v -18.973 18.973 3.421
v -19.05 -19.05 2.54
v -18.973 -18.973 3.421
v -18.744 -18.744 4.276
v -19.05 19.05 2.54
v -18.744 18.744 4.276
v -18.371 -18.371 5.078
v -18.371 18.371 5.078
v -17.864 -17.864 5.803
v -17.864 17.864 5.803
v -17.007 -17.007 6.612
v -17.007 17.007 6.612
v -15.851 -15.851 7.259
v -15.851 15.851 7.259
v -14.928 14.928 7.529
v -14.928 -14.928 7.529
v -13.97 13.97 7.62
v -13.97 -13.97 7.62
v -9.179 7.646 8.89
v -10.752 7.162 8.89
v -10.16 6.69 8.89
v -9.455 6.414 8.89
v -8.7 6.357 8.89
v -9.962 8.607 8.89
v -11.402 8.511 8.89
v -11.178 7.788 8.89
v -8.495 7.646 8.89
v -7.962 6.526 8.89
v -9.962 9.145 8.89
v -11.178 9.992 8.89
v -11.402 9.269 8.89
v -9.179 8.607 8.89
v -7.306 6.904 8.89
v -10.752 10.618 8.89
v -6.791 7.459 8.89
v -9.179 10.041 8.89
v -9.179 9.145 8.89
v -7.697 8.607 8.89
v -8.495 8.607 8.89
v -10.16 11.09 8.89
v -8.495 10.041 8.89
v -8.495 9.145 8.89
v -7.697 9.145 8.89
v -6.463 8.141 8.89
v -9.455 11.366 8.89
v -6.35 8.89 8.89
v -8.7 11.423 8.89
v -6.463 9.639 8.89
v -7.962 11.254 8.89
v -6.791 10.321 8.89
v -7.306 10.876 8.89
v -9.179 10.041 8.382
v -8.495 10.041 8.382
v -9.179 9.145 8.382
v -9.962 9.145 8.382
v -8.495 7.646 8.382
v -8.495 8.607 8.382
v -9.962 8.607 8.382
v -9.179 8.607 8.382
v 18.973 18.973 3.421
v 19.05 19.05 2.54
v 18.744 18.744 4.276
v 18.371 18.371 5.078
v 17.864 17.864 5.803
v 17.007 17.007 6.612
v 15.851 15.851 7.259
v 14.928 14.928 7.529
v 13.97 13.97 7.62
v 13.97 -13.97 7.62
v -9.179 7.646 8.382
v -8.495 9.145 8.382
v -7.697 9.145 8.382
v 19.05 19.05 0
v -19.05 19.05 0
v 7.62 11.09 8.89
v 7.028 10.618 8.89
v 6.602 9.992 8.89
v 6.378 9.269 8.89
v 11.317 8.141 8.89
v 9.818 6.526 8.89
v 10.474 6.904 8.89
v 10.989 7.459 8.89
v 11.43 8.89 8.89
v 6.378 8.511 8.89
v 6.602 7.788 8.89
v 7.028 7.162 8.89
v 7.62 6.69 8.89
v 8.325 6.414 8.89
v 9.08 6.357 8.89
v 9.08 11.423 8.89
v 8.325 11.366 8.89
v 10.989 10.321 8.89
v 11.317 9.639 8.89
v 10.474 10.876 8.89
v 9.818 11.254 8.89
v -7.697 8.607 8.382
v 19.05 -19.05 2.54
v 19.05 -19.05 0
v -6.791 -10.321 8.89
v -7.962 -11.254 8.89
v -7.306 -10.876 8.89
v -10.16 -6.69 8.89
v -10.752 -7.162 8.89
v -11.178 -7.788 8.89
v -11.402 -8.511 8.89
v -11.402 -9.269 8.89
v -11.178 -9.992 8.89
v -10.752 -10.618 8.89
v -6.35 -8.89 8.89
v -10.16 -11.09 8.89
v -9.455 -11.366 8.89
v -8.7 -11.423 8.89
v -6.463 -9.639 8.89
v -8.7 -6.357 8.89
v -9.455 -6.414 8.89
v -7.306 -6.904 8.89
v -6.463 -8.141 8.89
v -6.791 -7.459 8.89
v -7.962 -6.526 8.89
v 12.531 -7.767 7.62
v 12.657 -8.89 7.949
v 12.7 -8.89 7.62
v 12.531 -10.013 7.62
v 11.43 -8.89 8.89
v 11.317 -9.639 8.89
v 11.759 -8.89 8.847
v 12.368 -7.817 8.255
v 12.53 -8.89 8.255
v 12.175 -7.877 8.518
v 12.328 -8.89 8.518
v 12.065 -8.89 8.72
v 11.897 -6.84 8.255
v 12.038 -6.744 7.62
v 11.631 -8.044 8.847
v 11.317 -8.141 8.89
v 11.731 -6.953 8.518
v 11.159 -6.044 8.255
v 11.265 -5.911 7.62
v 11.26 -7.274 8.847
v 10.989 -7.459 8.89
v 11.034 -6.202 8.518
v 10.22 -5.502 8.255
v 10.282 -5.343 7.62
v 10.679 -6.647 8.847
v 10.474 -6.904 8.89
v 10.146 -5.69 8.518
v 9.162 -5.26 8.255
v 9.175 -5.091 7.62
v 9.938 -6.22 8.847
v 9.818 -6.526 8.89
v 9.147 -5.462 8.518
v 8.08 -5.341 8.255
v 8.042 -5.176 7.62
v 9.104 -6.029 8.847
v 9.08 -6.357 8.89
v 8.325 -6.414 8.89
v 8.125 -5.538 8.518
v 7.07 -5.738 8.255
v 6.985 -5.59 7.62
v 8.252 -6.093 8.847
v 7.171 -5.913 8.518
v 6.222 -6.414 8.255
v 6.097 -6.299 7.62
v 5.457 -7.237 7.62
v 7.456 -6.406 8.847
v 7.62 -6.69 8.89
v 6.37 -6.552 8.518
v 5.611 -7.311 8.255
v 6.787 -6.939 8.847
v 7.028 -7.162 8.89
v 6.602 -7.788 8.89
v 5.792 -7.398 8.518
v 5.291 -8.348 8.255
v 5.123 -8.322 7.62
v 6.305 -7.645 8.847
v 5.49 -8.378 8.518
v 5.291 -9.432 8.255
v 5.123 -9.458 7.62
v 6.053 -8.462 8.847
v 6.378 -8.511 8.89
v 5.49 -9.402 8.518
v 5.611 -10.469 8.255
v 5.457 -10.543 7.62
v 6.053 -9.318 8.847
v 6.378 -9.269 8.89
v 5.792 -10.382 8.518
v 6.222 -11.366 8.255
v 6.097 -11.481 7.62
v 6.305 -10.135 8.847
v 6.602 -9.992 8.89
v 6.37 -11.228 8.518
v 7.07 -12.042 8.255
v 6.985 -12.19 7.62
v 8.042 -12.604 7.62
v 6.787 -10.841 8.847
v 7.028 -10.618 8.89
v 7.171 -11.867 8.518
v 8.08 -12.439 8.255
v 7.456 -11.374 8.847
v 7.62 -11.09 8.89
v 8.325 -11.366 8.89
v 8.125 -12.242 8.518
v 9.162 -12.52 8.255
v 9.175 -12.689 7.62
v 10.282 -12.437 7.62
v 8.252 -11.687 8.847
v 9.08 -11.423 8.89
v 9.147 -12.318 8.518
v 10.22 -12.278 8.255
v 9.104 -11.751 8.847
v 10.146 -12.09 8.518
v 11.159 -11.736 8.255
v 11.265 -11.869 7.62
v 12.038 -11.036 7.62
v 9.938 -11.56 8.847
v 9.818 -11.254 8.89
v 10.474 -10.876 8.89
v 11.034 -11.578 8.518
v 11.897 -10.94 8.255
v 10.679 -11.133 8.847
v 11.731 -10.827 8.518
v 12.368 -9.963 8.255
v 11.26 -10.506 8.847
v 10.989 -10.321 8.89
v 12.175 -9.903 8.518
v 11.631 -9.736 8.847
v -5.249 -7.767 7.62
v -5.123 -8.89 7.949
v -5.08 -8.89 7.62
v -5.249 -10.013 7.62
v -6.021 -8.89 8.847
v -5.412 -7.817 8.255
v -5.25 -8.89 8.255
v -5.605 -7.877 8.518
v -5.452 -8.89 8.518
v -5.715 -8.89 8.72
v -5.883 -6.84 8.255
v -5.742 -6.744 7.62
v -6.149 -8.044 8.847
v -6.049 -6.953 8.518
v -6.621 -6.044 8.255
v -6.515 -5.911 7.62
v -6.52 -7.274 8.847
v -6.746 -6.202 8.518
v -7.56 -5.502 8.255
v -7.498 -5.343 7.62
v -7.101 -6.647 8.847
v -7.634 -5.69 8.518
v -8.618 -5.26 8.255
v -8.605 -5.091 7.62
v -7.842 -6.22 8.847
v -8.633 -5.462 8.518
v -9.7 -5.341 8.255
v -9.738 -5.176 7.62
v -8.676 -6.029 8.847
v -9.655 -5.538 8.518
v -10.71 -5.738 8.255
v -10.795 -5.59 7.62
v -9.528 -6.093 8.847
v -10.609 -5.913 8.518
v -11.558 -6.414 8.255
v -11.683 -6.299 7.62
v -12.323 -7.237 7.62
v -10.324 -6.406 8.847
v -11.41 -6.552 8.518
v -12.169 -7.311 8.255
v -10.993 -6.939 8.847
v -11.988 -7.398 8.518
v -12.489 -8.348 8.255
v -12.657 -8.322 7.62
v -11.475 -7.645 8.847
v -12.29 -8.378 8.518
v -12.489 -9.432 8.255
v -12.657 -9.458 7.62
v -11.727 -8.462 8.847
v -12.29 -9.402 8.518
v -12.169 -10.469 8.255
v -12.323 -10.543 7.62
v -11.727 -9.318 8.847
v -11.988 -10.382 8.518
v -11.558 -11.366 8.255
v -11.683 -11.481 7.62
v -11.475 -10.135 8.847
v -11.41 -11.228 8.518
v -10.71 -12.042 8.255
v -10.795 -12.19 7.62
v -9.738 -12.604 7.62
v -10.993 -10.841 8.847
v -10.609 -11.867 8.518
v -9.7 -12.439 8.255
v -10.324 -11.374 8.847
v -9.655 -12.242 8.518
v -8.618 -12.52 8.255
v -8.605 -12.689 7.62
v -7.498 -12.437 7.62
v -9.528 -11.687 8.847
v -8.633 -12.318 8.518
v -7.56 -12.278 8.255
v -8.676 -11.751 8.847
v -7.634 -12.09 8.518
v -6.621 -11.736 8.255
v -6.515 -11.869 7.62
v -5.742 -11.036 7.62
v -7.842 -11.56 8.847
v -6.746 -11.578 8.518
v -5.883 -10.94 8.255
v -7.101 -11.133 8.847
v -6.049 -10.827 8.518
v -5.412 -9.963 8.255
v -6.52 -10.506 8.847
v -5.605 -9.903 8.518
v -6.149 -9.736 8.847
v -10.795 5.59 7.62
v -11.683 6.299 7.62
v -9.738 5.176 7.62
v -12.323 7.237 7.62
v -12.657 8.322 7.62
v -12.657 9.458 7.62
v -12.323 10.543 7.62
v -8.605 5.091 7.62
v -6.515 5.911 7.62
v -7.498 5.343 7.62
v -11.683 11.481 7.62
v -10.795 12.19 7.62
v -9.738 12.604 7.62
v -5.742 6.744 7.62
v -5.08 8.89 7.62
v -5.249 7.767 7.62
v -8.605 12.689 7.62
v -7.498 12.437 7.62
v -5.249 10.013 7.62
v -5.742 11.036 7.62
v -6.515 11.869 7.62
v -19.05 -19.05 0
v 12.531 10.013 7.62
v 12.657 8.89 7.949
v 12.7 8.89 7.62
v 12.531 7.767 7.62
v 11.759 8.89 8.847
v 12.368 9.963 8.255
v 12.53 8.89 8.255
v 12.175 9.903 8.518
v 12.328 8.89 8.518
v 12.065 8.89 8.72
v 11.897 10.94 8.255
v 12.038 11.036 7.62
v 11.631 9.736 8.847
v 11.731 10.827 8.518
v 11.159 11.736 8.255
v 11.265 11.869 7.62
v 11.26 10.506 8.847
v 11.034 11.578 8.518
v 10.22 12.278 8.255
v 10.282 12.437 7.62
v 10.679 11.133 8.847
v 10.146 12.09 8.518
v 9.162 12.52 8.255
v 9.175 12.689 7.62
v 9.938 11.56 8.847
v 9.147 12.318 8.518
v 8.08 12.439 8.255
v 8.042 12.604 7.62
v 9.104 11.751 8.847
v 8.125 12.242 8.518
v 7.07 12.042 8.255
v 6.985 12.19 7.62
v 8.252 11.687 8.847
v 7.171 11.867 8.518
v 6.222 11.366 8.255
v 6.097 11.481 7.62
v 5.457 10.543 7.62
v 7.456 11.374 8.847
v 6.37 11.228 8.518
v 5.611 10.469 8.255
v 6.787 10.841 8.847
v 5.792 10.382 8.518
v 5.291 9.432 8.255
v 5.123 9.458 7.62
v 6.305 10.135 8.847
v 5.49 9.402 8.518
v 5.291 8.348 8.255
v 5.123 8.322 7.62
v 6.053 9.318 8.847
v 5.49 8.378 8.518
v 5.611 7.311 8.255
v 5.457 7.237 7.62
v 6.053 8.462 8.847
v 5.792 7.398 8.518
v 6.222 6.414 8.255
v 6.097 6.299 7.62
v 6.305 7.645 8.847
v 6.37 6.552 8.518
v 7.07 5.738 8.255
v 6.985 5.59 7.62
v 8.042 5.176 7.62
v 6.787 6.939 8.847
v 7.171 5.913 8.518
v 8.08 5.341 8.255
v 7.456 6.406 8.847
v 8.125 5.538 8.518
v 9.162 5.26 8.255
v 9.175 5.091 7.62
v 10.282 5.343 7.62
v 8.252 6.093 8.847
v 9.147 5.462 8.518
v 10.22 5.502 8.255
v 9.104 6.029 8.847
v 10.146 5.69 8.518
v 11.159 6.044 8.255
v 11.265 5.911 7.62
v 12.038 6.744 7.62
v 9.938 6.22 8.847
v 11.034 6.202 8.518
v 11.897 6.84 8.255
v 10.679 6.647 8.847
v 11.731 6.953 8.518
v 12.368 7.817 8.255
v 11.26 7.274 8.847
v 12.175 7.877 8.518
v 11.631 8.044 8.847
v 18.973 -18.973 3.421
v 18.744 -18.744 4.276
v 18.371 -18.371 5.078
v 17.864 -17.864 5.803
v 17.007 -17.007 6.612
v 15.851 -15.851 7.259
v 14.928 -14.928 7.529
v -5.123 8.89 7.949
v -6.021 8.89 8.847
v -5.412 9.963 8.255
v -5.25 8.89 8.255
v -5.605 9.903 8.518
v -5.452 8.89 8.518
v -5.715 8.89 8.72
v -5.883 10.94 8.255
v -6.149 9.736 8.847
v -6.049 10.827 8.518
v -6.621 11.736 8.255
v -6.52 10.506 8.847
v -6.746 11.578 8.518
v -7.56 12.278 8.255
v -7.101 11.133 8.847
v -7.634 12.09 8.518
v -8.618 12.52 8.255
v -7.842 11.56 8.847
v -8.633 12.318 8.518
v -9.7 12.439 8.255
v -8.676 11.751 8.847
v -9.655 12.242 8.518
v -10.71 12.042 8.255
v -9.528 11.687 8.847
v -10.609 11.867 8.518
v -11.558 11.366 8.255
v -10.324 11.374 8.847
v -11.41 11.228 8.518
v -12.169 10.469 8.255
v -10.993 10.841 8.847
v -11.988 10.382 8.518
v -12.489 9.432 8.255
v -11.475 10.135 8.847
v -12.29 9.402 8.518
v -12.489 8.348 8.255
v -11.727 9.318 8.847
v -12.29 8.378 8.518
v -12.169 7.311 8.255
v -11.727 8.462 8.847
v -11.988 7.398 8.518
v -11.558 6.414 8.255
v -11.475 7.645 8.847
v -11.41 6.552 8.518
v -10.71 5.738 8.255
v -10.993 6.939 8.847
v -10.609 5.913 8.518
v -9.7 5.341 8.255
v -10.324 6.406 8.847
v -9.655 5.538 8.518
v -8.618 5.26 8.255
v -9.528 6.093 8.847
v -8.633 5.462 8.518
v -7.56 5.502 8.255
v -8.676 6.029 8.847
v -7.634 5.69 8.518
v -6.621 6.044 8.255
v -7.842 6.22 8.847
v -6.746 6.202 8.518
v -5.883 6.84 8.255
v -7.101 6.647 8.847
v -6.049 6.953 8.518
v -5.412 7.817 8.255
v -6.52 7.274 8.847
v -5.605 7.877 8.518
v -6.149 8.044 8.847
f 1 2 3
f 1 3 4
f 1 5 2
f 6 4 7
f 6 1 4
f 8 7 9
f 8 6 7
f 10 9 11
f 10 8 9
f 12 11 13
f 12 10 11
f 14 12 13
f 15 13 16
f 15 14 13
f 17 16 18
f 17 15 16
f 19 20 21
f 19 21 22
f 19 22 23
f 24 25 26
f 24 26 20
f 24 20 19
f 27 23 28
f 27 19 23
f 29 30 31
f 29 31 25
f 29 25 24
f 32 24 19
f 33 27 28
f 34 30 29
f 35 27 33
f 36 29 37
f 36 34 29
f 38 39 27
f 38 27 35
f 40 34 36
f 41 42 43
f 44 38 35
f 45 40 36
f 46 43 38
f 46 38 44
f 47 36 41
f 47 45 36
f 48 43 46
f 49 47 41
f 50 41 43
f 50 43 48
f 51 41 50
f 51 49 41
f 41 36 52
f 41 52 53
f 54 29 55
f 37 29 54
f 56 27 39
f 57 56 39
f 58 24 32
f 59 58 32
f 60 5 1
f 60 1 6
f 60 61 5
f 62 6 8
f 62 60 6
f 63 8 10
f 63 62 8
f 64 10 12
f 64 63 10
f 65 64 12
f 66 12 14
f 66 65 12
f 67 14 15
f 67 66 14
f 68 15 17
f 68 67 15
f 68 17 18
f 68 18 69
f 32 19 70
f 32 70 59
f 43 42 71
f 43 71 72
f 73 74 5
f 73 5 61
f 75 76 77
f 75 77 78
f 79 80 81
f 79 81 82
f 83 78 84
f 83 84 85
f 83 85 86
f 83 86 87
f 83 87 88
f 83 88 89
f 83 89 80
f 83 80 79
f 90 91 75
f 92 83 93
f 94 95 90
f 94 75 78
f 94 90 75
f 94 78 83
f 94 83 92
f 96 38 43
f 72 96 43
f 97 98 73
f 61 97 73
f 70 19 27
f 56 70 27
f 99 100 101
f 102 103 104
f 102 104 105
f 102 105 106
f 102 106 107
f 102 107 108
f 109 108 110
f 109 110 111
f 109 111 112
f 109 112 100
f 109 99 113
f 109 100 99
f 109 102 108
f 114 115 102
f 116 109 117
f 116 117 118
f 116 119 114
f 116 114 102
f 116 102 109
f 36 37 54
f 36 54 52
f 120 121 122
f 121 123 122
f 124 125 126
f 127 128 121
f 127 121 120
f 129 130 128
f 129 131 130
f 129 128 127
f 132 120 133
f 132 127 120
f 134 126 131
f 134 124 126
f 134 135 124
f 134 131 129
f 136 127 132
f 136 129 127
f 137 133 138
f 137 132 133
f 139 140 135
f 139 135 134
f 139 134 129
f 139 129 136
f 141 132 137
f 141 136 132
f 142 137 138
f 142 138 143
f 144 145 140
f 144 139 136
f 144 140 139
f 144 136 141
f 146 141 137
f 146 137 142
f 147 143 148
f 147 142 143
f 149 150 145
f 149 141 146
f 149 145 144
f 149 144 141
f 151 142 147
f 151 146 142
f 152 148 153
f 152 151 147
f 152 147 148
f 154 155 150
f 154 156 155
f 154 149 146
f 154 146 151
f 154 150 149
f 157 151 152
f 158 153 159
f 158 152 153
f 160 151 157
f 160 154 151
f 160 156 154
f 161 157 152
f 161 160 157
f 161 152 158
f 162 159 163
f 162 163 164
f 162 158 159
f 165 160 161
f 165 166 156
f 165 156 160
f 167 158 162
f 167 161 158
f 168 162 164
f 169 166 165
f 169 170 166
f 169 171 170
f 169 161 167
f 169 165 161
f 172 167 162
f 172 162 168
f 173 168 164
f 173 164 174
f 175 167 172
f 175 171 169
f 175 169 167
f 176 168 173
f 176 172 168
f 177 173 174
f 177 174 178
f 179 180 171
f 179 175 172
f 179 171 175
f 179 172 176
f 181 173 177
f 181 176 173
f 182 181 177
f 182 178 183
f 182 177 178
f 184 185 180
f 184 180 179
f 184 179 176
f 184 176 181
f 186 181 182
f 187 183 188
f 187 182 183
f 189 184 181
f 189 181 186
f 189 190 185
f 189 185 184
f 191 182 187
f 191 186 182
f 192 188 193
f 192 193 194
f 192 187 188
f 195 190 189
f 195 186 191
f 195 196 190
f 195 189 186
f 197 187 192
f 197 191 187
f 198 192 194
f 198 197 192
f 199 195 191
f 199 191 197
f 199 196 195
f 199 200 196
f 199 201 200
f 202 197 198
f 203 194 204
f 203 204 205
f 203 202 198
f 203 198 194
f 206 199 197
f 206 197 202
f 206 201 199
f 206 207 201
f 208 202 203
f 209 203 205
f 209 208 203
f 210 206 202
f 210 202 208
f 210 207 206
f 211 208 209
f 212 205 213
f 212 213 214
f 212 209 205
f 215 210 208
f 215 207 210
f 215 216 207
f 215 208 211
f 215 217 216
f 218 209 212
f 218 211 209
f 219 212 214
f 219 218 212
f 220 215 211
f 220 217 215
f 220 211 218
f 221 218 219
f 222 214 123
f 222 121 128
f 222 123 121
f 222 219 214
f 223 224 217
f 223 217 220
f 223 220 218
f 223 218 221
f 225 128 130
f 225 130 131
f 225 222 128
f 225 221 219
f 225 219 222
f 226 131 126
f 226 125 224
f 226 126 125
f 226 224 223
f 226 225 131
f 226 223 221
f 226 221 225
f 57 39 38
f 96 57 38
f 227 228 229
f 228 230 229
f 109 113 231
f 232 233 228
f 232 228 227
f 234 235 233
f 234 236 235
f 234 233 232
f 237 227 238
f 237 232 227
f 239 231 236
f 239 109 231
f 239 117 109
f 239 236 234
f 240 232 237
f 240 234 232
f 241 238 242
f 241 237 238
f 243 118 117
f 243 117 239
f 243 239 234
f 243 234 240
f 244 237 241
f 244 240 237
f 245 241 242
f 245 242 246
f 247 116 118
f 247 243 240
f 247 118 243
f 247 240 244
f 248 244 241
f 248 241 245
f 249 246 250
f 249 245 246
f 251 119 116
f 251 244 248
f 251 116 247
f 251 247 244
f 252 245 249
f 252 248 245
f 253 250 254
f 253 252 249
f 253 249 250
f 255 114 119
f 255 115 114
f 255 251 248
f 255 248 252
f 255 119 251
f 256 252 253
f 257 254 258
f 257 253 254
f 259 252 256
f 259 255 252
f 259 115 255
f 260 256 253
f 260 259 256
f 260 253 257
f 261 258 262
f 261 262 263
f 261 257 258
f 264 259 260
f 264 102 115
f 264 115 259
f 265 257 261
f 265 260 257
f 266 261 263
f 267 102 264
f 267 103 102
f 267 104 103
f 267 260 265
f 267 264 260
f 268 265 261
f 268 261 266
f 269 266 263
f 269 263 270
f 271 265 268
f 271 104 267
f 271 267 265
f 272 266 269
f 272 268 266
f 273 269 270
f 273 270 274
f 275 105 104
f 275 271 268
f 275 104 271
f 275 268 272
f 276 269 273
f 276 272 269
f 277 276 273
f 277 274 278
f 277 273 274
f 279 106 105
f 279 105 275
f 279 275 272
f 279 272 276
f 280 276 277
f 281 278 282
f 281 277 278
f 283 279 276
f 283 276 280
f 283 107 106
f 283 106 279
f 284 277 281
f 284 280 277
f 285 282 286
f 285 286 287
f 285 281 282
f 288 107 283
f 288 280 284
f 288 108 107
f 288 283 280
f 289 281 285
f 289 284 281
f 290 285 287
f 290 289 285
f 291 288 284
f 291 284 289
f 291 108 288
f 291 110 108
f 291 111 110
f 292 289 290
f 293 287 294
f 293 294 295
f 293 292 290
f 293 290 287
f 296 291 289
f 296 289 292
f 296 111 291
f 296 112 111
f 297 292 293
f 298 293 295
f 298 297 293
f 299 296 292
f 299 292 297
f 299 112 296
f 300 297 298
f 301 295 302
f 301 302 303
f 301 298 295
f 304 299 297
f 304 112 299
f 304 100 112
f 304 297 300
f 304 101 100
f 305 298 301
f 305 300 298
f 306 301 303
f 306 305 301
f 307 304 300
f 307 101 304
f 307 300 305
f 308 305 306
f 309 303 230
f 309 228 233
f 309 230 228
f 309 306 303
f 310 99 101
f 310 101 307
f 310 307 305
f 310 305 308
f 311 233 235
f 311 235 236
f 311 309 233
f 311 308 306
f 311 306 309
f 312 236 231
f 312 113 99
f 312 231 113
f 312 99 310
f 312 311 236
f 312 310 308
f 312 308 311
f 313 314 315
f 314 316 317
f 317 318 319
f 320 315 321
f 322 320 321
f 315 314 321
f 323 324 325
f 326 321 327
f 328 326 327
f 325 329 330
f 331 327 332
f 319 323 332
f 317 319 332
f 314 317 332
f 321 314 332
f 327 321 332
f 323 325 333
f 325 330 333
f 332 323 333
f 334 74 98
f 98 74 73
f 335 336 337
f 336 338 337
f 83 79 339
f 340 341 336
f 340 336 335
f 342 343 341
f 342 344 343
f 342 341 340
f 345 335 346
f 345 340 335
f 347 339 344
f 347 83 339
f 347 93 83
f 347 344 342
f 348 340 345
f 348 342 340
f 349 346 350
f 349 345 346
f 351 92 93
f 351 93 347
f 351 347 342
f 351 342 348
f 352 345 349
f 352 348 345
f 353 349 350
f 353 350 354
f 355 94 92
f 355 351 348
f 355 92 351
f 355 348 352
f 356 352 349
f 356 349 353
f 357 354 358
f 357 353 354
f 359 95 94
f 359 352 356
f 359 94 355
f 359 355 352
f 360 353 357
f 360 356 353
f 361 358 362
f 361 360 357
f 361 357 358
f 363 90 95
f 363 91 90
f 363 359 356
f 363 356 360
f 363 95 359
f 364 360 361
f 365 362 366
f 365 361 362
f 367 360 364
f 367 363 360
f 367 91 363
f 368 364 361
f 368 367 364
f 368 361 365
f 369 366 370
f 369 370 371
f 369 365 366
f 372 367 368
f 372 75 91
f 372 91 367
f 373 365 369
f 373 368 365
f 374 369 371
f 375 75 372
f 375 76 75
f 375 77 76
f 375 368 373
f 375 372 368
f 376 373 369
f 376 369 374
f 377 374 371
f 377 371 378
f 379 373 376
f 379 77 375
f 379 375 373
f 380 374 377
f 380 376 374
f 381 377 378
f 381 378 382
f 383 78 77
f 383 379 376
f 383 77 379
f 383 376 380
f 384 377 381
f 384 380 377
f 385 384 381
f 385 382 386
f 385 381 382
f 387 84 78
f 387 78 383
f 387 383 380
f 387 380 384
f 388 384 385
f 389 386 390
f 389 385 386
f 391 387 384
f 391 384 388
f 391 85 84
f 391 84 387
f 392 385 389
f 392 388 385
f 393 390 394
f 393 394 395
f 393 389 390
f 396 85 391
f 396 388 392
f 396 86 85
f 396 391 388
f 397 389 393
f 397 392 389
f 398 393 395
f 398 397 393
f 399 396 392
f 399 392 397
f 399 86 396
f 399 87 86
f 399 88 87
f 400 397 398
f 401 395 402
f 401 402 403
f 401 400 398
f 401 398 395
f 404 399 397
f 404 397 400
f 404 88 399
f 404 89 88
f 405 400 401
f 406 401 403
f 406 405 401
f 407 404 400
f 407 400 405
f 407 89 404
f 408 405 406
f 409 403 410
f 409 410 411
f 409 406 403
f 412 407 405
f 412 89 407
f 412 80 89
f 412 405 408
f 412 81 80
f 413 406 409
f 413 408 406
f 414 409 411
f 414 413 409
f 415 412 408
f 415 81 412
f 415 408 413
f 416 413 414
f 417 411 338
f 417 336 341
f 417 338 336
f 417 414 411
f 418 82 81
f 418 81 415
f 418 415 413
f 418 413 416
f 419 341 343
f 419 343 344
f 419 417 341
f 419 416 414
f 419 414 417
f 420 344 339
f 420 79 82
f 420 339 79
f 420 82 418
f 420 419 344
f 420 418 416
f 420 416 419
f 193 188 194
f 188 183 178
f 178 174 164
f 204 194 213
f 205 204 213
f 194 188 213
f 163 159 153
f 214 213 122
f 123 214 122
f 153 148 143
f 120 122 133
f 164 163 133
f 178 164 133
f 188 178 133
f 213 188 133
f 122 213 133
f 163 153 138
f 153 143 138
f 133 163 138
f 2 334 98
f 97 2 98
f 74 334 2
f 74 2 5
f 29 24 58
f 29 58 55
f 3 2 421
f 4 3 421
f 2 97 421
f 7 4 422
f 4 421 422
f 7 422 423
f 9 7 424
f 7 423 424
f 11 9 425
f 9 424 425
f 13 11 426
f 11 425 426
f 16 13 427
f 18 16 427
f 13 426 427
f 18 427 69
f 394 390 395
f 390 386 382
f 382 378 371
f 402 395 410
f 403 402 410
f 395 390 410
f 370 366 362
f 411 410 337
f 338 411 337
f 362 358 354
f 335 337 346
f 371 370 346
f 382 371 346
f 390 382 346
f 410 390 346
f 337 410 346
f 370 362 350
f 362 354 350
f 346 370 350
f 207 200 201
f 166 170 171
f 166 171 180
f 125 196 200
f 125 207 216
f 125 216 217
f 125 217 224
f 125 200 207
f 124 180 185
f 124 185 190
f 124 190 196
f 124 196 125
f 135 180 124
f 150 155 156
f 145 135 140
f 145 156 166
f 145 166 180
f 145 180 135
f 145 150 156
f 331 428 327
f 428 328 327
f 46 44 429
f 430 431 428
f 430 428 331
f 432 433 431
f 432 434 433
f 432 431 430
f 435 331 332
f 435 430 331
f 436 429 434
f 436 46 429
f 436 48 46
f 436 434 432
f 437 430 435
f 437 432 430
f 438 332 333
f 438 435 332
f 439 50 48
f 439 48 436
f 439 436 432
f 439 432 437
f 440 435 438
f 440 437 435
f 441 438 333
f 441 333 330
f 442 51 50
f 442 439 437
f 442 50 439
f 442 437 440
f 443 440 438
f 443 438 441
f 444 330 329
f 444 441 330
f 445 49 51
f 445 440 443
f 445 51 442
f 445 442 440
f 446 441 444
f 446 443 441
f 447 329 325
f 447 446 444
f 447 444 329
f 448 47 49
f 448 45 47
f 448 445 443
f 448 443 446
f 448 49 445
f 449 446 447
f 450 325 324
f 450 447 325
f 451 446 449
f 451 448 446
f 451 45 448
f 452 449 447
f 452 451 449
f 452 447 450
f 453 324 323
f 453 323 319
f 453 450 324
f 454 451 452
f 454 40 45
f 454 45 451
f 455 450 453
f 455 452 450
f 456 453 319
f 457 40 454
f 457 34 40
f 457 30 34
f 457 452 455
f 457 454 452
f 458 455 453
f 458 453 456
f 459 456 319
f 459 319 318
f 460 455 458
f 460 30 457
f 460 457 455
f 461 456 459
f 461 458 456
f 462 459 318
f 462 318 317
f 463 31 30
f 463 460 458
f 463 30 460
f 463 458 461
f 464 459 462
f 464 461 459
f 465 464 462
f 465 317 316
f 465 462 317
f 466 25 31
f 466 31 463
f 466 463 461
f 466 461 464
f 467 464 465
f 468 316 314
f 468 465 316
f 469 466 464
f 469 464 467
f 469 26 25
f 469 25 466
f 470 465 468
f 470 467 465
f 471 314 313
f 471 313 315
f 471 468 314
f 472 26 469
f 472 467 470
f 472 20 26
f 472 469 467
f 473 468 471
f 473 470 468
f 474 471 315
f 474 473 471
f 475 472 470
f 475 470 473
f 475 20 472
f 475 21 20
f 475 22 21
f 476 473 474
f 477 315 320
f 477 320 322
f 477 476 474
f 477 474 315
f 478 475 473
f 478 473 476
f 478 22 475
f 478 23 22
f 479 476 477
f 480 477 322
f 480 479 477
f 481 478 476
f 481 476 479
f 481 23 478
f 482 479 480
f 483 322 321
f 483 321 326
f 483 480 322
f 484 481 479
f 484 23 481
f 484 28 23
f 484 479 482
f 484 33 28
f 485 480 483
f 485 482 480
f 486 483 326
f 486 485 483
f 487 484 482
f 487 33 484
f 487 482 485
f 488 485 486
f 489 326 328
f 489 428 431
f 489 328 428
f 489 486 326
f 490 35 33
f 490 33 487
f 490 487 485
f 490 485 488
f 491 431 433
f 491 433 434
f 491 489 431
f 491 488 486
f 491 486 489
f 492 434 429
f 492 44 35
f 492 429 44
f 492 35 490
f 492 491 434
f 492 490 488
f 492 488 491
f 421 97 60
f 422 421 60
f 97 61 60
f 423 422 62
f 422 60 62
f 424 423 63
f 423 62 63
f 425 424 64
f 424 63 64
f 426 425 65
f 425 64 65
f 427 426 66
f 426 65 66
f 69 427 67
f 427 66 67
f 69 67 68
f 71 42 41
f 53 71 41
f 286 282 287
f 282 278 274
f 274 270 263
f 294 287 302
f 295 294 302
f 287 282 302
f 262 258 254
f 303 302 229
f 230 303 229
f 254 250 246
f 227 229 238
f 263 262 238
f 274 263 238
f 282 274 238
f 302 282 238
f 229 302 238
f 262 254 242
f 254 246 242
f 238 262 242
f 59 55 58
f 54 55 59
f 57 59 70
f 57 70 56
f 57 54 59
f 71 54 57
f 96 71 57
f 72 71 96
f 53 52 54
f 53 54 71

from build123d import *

# Parameters (mm, degrees)
F0_W     = 38.1
F0_H     = 38.1
F1_DEPTH = 7.62
F2_R     = 5.08
F3_R     = 3.81
F4_DEPTH = 1.27
F5_R     = 1.26999
F5_2_R   = 1.26999
F5_3_R   = 1.26999
F5_4_R   = 1.26999
F6_W     = 0.684382394
F6_H     = 0.8962163702
F6_W_2   = 0.7821517065
F6_H_2   = 0.5377288908
F6_W_3   = 0.7984461263
F6_H_3   = 0.9613940492
F7_DEPTH = 0.508


# Not quite as in the source:
# - a fillet or chamfer is up to 0.001 mm smaller than in the source, because OpenCascade refuses the exact size
# - a feature of the source that left no trace in its solid (it failed there, or was rolled back) is left out


with BuildPart() as f1:
    # F0 (on Top) → F1 (new body)
    with BuildSketch(Plane.XY):
        Rectangle(F0_W, F0_H)
    extrude(amount=F1_DEPTH)

    # F2
    f2_edges = [f1.edges().sort_by_distance(p)[0] for p in [
        (-19.05, 0, 7.62),
        (0, 19.05, 7.62),
        (19.05, 0, 7.62),
        (0, -19.05, 7.62),
    ]]
    fillet(f2_edges, radius=F2_R)


with BuildPart() as f4:
    # F3 (on face) → F4 (new body)
    with BuildSketch(Plane.XY.offset(7.62)):
        with Locations((8.89, 8.89)):
            Circle(F3_R)
    extrude(amount=F4_DEPTH)

    # F5 (radius 1.27 in the source; OpenCascade refuses exactly that, so slightly less here)
    f5_edges = [f4.edges().sort_by_distance(p)[0] for p in [
        (5.08, 8.89, 8.89),
    ]]
    fillet(f5_edges, radius=F5_R)


with BuildPart() as f4b:
    # F3 (on face) → F4, piece 2 (new body)
    with BuildSketch(Plane.XY.offset(7.62)):
        with Locations((8.89, -8.89)):
            Circle(F3_R)
    extrude(amount=F4_DEPTH)

    # F5#2 (radius 1.27 in the source; OpenCascade refuses exactly that, so slightly less here)
    f5_2_edges = [f4b.edges().sort_by_distance(p)[0] for p in [
        (5.08, -8.89, 8.89),
    ]]
    fillet(f5_2_edges, radius=F5_2_R)


with BuildPart() as f4c:
    # F3 (on face) → F4, piece 3 (new body)
    with BuildSketch(Plane.XY.offset(7.62)):
        with Locations((-8.89, -8.89)):
            Circle(F3_R)
    extrude(amount=F4_DEPTH)

    # F5#3 (radius 1.27 in the source; OpenCascade refuses exactly that, so slightly less here)
    f5_3_edges = [f4c.edges().sort_by_distance(p)[0] for p in [
        (-12.7, -8.89, 8.89),
    ]]
    fillet(f5_3_edges, radius=F5_3_R)


with BuildPart() as f4d:
    # F3 (on face) → F4, piece 4 (new body)
    with BuildSketch(Plane.XY.offset(7.62)):
        with Locations((-8.89, 8.89)):
            Circle(F3_R)
    extrude(amount=F4_DEPTH)

    # F5#4 (radius 1.27 in the source; OpenCascade refuses exactly that, so slightly less here)
    f5_4_edges = [f4d.edges().sort_by_distance(p)[0] for p in [
        (-12.7, 8.89, 8.89),
    ]]
    fillet(f5_4_edges, radius=F5_4_R)

    # F6 (on face) → F7 (cut)
    with BuildSketch(Plane.XY.offset(8.89)):
        with Locations((-8.8372193277, 9.5931137912)):
            Rectangle(F6_W, F6_H)
        with Locations((-9.5704863779, 8.8761411607)):
            Rectangle(F6_W_2, F6_H_2)
        with Locations((-8.8372193277, 8.8761411607)):
            Rectangle(F6_W, F6_H_2)
        with Locations((-8.0958050676, 8.8761411607)):
            Rectangle(F6_W_3, F6_H_2)
        with Locations((-8.8372193277, 8.1265796907)):
            Rectangle(F6_W, F6_H_3)
        with Locations((8.8355047628, 8.2747801207)):
            Rectangle(F6_W, F6_H_3)
        with Locations((8.1022377126, 9.0243415907)):
            Rectangle(F6_W_2, F6_H_2)
        with Locations((8.8355047628, 9.0243415907)):
            Rectangle(F6_W, F6_H_2)
        with Locations((8.8355047628, 9.7413142212)):
            Rectangle(F6_W, F6_H)
        with Locations((9.5769190229, 9.0243415907)):
            Rectangle(F6_W_3, F6_H_2)
        with Locations((-9.6729216166, -8.7657244876)):
            Rectangle(F6_W_2, F6_H_2)
        with Locations((-8.9396545663, -8.7657244876)):
            Rectangle(F6_W, F6_H_2)
        with Locations((-8.9396545663, -8.0487518571)):
            Rectangle(F6_W, F6_H)
        with Locations((-8.1982403062, -8.7657244876)):
            Rectangle(F6_W_3, F6_H_2)
        with Locations((8.8686496019, -9.6509321593)):
            Rectangle(F6_W, F6_H_3)
        with Locations((8.1353825517, -8.9013706893)):
            Rectangle(F6_W_2, F6_H_2)
        with Locations((9.6100638621, -8.9013706893)):
            Rectangle(F6_W_3, F6_H_2)
        with Locations((8.8686496019, -8.1843980588)):
            Rectangle(F6_W, F6_H)
        with Locations((8.8686496019, -8.9013706893)):
            Rectangle(F6_W, F6_H_2)
        with Locations((-8.9396545663, -9.5152859576)):
            Rectangle(F6_W, F6_H_3)
    extrude(amount=-F7_DEPTH, mode=Mode.SUBTRACT)


solid = Compound([f1.part, f4.part, f4b.part, f4c.part, f4d.part])
